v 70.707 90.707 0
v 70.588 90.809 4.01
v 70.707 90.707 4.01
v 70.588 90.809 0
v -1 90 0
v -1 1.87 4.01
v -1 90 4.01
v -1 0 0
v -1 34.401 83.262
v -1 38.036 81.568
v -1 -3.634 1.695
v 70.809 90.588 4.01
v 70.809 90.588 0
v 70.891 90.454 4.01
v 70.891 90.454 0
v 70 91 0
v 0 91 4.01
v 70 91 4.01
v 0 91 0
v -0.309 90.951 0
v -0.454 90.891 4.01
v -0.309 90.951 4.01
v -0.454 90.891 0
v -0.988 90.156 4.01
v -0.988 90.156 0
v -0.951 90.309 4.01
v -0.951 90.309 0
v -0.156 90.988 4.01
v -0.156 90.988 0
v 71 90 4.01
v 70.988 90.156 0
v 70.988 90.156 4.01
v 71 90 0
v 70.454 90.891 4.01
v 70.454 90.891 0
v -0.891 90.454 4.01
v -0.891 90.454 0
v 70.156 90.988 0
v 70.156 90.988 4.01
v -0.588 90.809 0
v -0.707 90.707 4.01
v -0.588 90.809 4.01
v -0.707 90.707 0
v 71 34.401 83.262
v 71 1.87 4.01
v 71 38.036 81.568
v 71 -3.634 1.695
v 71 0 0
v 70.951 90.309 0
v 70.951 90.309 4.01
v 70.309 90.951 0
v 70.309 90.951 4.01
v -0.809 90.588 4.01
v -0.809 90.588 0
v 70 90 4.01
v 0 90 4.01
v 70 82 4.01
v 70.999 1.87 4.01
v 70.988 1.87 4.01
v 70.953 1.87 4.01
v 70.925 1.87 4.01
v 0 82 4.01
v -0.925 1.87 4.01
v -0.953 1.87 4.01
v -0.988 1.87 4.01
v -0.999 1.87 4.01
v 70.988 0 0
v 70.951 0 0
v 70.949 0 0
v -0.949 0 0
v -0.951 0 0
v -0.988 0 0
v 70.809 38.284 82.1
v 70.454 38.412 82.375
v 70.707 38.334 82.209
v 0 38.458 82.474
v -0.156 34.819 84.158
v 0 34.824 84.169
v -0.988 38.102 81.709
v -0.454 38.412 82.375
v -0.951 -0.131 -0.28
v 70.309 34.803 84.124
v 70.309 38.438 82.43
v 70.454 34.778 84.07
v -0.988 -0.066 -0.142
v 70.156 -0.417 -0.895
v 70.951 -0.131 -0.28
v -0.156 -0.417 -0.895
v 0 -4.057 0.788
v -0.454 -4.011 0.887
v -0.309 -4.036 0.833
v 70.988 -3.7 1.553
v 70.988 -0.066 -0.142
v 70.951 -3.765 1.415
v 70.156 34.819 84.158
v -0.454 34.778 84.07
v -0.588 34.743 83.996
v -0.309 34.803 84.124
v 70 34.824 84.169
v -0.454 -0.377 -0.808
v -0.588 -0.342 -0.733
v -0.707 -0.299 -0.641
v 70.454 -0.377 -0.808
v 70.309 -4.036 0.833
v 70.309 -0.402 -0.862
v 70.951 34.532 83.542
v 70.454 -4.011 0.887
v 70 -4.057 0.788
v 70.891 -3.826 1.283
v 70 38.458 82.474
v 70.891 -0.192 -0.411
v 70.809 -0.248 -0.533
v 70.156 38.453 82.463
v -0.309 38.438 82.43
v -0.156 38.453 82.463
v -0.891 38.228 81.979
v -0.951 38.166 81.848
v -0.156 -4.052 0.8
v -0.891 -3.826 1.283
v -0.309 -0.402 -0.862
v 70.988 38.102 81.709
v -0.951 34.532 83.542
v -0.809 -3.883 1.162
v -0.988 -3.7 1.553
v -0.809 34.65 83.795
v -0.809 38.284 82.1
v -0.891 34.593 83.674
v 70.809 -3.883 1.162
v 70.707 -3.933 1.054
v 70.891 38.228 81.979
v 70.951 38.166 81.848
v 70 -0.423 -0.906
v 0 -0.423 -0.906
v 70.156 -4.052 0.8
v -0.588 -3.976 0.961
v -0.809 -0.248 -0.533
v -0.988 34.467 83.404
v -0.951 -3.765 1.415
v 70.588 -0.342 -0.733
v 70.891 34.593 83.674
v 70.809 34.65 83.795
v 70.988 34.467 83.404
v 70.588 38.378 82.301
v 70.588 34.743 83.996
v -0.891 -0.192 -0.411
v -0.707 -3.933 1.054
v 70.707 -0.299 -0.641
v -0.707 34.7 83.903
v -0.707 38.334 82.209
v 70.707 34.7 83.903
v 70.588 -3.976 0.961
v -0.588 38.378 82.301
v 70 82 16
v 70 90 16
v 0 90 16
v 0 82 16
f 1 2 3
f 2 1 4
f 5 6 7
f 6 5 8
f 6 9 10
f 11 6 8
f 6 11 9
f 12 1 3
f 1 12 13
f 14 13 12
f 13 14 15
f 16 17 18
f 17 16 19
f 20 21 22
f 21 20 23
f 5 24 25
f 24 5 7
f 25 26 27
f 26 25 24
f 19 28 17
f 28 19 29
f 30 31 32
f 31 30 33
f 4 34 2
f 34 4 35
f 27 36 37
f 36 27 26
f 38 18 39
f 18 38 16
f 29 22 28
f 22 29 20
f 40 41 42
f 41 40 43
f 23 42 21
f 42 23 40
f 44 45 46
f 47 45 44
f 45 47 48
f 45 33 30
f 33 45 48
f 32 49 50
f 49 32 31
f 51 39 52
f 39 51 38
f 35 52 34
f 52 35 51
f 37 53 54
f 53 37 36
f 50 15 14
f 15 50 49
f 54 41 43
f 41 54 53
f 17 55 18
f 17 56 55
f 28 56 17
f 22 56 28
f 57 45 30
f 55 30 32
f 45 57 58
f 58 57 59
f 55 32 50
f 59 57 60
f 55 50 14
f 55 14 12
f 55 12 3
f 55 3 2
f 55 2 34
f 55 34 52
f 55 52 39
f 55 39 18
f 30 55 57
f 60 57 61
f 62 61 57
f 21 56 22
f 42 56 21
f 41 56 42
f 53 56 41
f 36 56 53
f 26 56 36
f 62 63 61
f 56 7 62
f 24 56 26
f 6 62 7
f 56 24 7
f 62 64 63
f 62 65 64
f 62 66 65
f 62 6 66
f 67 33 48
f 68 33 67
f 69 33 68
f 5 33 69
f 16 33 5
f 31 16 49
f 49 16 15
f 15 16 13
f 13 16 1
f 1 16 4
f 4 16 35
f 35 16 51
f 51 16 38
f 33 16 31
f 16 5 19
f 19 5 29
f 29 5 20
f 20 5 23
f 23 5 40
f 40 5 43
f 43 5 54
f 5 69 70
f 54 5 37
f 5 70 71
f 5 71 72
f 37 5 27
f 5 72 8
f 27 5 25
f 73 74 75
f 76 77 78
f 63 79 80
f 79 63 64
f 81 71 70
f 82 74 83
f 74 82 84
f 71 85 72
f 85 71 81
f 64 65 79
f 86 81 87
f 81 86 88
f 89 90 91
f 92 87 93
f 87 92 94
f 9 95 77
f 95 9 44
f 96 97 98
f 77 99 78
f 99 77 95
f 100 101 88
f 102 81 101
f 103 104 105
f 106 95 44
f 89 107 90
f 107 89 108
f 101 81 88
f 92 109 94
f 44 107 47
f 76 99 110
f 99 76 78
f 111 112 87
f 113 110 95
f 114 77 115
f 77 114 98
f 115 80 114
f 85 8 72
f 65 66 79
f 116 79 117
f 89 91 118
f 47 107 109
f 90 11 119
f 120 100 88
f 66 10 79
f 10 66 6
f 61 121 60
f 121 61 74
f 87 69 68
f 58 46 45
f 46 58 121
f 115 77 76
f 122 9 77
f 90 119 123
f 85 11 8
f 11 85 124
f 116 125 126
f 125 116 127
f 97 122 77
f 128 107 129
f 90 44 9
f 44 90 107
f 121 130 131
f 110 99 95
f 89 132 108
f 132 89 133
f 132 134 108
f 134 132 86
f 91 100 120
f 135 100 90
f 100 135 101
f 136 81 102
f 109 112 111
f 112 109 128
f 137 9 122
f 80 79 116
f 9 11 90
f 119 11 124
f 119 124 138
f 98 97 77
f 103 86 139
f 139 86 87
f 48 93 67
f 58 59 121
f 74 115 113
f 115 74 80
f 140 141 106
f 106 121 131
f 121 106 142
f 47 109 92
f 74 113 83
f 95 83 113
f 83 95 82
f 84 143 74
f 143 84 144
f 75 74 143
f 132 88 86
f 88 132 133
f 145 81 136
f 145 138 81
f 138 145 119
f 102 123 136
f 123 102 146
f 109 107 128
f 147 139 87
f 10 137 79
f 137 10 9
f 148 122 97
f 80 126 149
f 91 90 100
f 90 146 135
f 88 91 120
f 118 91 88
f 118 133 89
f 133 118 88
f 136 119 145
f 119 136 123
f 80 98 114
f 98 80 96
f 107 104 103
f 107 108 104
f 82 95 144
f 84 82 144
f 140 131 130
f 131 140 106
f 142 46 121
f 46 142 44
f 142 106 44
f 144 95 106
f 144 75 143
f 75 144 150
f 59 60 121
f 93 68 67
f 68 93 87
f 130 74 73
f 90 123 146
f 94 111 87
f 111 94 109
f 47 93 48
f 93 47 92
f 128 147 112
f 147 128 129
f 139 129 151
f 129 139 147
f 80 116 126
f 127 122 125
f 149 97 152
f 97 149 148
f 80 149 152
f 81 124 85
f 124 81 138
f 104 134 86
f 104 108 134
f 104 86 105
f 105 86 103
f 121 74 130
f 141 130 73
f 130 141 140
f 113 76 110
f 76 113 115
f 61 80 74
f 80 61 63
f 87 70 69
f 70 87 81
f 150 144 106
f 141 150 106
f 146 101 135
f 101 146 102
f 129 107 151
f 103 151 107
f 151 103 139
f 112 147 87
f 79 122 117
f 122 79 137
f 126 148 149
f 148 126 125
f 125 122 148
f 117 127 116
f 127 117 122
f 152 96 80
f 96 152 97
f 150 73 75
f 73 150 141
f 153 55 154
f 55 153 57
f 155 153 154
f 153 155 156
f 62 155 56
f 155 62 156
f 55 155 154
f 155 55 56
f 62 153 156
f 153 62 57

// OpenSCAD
// 02_parametric_phone_stand.scad
// Intermediate: Parametric phone stand
// Parameters
thickness = 4;        // mm
width = 70;           // mm
depth = 90;           // mm
angle = 65;           // degrees
lip_height = 12;      // mm
fillet_r = 6;         // mm (mock fillet by minkowski)

module plate(w, d, t){
  cube([w, d, t], center=false);
}

module fillet(shape, r){
  minkowski(){
    children();
    cylinder(h=0.01, r=r, $fn=40);
  }
}

// Back plate
module back(){
  rotate([angle,0,0])
    fillet(){ plate(width, depth, thickness); }
}

// Base
module base(){
  translate([0,0,0])
    fillet(){ plate(width, depth, thickness); }
}

// Lip
module lip(){
  translate([0, depth-8, thickness])
    cube([width, 8, lip_height], center=false);
}

union(){
  base();
  back();
  lip();
}
